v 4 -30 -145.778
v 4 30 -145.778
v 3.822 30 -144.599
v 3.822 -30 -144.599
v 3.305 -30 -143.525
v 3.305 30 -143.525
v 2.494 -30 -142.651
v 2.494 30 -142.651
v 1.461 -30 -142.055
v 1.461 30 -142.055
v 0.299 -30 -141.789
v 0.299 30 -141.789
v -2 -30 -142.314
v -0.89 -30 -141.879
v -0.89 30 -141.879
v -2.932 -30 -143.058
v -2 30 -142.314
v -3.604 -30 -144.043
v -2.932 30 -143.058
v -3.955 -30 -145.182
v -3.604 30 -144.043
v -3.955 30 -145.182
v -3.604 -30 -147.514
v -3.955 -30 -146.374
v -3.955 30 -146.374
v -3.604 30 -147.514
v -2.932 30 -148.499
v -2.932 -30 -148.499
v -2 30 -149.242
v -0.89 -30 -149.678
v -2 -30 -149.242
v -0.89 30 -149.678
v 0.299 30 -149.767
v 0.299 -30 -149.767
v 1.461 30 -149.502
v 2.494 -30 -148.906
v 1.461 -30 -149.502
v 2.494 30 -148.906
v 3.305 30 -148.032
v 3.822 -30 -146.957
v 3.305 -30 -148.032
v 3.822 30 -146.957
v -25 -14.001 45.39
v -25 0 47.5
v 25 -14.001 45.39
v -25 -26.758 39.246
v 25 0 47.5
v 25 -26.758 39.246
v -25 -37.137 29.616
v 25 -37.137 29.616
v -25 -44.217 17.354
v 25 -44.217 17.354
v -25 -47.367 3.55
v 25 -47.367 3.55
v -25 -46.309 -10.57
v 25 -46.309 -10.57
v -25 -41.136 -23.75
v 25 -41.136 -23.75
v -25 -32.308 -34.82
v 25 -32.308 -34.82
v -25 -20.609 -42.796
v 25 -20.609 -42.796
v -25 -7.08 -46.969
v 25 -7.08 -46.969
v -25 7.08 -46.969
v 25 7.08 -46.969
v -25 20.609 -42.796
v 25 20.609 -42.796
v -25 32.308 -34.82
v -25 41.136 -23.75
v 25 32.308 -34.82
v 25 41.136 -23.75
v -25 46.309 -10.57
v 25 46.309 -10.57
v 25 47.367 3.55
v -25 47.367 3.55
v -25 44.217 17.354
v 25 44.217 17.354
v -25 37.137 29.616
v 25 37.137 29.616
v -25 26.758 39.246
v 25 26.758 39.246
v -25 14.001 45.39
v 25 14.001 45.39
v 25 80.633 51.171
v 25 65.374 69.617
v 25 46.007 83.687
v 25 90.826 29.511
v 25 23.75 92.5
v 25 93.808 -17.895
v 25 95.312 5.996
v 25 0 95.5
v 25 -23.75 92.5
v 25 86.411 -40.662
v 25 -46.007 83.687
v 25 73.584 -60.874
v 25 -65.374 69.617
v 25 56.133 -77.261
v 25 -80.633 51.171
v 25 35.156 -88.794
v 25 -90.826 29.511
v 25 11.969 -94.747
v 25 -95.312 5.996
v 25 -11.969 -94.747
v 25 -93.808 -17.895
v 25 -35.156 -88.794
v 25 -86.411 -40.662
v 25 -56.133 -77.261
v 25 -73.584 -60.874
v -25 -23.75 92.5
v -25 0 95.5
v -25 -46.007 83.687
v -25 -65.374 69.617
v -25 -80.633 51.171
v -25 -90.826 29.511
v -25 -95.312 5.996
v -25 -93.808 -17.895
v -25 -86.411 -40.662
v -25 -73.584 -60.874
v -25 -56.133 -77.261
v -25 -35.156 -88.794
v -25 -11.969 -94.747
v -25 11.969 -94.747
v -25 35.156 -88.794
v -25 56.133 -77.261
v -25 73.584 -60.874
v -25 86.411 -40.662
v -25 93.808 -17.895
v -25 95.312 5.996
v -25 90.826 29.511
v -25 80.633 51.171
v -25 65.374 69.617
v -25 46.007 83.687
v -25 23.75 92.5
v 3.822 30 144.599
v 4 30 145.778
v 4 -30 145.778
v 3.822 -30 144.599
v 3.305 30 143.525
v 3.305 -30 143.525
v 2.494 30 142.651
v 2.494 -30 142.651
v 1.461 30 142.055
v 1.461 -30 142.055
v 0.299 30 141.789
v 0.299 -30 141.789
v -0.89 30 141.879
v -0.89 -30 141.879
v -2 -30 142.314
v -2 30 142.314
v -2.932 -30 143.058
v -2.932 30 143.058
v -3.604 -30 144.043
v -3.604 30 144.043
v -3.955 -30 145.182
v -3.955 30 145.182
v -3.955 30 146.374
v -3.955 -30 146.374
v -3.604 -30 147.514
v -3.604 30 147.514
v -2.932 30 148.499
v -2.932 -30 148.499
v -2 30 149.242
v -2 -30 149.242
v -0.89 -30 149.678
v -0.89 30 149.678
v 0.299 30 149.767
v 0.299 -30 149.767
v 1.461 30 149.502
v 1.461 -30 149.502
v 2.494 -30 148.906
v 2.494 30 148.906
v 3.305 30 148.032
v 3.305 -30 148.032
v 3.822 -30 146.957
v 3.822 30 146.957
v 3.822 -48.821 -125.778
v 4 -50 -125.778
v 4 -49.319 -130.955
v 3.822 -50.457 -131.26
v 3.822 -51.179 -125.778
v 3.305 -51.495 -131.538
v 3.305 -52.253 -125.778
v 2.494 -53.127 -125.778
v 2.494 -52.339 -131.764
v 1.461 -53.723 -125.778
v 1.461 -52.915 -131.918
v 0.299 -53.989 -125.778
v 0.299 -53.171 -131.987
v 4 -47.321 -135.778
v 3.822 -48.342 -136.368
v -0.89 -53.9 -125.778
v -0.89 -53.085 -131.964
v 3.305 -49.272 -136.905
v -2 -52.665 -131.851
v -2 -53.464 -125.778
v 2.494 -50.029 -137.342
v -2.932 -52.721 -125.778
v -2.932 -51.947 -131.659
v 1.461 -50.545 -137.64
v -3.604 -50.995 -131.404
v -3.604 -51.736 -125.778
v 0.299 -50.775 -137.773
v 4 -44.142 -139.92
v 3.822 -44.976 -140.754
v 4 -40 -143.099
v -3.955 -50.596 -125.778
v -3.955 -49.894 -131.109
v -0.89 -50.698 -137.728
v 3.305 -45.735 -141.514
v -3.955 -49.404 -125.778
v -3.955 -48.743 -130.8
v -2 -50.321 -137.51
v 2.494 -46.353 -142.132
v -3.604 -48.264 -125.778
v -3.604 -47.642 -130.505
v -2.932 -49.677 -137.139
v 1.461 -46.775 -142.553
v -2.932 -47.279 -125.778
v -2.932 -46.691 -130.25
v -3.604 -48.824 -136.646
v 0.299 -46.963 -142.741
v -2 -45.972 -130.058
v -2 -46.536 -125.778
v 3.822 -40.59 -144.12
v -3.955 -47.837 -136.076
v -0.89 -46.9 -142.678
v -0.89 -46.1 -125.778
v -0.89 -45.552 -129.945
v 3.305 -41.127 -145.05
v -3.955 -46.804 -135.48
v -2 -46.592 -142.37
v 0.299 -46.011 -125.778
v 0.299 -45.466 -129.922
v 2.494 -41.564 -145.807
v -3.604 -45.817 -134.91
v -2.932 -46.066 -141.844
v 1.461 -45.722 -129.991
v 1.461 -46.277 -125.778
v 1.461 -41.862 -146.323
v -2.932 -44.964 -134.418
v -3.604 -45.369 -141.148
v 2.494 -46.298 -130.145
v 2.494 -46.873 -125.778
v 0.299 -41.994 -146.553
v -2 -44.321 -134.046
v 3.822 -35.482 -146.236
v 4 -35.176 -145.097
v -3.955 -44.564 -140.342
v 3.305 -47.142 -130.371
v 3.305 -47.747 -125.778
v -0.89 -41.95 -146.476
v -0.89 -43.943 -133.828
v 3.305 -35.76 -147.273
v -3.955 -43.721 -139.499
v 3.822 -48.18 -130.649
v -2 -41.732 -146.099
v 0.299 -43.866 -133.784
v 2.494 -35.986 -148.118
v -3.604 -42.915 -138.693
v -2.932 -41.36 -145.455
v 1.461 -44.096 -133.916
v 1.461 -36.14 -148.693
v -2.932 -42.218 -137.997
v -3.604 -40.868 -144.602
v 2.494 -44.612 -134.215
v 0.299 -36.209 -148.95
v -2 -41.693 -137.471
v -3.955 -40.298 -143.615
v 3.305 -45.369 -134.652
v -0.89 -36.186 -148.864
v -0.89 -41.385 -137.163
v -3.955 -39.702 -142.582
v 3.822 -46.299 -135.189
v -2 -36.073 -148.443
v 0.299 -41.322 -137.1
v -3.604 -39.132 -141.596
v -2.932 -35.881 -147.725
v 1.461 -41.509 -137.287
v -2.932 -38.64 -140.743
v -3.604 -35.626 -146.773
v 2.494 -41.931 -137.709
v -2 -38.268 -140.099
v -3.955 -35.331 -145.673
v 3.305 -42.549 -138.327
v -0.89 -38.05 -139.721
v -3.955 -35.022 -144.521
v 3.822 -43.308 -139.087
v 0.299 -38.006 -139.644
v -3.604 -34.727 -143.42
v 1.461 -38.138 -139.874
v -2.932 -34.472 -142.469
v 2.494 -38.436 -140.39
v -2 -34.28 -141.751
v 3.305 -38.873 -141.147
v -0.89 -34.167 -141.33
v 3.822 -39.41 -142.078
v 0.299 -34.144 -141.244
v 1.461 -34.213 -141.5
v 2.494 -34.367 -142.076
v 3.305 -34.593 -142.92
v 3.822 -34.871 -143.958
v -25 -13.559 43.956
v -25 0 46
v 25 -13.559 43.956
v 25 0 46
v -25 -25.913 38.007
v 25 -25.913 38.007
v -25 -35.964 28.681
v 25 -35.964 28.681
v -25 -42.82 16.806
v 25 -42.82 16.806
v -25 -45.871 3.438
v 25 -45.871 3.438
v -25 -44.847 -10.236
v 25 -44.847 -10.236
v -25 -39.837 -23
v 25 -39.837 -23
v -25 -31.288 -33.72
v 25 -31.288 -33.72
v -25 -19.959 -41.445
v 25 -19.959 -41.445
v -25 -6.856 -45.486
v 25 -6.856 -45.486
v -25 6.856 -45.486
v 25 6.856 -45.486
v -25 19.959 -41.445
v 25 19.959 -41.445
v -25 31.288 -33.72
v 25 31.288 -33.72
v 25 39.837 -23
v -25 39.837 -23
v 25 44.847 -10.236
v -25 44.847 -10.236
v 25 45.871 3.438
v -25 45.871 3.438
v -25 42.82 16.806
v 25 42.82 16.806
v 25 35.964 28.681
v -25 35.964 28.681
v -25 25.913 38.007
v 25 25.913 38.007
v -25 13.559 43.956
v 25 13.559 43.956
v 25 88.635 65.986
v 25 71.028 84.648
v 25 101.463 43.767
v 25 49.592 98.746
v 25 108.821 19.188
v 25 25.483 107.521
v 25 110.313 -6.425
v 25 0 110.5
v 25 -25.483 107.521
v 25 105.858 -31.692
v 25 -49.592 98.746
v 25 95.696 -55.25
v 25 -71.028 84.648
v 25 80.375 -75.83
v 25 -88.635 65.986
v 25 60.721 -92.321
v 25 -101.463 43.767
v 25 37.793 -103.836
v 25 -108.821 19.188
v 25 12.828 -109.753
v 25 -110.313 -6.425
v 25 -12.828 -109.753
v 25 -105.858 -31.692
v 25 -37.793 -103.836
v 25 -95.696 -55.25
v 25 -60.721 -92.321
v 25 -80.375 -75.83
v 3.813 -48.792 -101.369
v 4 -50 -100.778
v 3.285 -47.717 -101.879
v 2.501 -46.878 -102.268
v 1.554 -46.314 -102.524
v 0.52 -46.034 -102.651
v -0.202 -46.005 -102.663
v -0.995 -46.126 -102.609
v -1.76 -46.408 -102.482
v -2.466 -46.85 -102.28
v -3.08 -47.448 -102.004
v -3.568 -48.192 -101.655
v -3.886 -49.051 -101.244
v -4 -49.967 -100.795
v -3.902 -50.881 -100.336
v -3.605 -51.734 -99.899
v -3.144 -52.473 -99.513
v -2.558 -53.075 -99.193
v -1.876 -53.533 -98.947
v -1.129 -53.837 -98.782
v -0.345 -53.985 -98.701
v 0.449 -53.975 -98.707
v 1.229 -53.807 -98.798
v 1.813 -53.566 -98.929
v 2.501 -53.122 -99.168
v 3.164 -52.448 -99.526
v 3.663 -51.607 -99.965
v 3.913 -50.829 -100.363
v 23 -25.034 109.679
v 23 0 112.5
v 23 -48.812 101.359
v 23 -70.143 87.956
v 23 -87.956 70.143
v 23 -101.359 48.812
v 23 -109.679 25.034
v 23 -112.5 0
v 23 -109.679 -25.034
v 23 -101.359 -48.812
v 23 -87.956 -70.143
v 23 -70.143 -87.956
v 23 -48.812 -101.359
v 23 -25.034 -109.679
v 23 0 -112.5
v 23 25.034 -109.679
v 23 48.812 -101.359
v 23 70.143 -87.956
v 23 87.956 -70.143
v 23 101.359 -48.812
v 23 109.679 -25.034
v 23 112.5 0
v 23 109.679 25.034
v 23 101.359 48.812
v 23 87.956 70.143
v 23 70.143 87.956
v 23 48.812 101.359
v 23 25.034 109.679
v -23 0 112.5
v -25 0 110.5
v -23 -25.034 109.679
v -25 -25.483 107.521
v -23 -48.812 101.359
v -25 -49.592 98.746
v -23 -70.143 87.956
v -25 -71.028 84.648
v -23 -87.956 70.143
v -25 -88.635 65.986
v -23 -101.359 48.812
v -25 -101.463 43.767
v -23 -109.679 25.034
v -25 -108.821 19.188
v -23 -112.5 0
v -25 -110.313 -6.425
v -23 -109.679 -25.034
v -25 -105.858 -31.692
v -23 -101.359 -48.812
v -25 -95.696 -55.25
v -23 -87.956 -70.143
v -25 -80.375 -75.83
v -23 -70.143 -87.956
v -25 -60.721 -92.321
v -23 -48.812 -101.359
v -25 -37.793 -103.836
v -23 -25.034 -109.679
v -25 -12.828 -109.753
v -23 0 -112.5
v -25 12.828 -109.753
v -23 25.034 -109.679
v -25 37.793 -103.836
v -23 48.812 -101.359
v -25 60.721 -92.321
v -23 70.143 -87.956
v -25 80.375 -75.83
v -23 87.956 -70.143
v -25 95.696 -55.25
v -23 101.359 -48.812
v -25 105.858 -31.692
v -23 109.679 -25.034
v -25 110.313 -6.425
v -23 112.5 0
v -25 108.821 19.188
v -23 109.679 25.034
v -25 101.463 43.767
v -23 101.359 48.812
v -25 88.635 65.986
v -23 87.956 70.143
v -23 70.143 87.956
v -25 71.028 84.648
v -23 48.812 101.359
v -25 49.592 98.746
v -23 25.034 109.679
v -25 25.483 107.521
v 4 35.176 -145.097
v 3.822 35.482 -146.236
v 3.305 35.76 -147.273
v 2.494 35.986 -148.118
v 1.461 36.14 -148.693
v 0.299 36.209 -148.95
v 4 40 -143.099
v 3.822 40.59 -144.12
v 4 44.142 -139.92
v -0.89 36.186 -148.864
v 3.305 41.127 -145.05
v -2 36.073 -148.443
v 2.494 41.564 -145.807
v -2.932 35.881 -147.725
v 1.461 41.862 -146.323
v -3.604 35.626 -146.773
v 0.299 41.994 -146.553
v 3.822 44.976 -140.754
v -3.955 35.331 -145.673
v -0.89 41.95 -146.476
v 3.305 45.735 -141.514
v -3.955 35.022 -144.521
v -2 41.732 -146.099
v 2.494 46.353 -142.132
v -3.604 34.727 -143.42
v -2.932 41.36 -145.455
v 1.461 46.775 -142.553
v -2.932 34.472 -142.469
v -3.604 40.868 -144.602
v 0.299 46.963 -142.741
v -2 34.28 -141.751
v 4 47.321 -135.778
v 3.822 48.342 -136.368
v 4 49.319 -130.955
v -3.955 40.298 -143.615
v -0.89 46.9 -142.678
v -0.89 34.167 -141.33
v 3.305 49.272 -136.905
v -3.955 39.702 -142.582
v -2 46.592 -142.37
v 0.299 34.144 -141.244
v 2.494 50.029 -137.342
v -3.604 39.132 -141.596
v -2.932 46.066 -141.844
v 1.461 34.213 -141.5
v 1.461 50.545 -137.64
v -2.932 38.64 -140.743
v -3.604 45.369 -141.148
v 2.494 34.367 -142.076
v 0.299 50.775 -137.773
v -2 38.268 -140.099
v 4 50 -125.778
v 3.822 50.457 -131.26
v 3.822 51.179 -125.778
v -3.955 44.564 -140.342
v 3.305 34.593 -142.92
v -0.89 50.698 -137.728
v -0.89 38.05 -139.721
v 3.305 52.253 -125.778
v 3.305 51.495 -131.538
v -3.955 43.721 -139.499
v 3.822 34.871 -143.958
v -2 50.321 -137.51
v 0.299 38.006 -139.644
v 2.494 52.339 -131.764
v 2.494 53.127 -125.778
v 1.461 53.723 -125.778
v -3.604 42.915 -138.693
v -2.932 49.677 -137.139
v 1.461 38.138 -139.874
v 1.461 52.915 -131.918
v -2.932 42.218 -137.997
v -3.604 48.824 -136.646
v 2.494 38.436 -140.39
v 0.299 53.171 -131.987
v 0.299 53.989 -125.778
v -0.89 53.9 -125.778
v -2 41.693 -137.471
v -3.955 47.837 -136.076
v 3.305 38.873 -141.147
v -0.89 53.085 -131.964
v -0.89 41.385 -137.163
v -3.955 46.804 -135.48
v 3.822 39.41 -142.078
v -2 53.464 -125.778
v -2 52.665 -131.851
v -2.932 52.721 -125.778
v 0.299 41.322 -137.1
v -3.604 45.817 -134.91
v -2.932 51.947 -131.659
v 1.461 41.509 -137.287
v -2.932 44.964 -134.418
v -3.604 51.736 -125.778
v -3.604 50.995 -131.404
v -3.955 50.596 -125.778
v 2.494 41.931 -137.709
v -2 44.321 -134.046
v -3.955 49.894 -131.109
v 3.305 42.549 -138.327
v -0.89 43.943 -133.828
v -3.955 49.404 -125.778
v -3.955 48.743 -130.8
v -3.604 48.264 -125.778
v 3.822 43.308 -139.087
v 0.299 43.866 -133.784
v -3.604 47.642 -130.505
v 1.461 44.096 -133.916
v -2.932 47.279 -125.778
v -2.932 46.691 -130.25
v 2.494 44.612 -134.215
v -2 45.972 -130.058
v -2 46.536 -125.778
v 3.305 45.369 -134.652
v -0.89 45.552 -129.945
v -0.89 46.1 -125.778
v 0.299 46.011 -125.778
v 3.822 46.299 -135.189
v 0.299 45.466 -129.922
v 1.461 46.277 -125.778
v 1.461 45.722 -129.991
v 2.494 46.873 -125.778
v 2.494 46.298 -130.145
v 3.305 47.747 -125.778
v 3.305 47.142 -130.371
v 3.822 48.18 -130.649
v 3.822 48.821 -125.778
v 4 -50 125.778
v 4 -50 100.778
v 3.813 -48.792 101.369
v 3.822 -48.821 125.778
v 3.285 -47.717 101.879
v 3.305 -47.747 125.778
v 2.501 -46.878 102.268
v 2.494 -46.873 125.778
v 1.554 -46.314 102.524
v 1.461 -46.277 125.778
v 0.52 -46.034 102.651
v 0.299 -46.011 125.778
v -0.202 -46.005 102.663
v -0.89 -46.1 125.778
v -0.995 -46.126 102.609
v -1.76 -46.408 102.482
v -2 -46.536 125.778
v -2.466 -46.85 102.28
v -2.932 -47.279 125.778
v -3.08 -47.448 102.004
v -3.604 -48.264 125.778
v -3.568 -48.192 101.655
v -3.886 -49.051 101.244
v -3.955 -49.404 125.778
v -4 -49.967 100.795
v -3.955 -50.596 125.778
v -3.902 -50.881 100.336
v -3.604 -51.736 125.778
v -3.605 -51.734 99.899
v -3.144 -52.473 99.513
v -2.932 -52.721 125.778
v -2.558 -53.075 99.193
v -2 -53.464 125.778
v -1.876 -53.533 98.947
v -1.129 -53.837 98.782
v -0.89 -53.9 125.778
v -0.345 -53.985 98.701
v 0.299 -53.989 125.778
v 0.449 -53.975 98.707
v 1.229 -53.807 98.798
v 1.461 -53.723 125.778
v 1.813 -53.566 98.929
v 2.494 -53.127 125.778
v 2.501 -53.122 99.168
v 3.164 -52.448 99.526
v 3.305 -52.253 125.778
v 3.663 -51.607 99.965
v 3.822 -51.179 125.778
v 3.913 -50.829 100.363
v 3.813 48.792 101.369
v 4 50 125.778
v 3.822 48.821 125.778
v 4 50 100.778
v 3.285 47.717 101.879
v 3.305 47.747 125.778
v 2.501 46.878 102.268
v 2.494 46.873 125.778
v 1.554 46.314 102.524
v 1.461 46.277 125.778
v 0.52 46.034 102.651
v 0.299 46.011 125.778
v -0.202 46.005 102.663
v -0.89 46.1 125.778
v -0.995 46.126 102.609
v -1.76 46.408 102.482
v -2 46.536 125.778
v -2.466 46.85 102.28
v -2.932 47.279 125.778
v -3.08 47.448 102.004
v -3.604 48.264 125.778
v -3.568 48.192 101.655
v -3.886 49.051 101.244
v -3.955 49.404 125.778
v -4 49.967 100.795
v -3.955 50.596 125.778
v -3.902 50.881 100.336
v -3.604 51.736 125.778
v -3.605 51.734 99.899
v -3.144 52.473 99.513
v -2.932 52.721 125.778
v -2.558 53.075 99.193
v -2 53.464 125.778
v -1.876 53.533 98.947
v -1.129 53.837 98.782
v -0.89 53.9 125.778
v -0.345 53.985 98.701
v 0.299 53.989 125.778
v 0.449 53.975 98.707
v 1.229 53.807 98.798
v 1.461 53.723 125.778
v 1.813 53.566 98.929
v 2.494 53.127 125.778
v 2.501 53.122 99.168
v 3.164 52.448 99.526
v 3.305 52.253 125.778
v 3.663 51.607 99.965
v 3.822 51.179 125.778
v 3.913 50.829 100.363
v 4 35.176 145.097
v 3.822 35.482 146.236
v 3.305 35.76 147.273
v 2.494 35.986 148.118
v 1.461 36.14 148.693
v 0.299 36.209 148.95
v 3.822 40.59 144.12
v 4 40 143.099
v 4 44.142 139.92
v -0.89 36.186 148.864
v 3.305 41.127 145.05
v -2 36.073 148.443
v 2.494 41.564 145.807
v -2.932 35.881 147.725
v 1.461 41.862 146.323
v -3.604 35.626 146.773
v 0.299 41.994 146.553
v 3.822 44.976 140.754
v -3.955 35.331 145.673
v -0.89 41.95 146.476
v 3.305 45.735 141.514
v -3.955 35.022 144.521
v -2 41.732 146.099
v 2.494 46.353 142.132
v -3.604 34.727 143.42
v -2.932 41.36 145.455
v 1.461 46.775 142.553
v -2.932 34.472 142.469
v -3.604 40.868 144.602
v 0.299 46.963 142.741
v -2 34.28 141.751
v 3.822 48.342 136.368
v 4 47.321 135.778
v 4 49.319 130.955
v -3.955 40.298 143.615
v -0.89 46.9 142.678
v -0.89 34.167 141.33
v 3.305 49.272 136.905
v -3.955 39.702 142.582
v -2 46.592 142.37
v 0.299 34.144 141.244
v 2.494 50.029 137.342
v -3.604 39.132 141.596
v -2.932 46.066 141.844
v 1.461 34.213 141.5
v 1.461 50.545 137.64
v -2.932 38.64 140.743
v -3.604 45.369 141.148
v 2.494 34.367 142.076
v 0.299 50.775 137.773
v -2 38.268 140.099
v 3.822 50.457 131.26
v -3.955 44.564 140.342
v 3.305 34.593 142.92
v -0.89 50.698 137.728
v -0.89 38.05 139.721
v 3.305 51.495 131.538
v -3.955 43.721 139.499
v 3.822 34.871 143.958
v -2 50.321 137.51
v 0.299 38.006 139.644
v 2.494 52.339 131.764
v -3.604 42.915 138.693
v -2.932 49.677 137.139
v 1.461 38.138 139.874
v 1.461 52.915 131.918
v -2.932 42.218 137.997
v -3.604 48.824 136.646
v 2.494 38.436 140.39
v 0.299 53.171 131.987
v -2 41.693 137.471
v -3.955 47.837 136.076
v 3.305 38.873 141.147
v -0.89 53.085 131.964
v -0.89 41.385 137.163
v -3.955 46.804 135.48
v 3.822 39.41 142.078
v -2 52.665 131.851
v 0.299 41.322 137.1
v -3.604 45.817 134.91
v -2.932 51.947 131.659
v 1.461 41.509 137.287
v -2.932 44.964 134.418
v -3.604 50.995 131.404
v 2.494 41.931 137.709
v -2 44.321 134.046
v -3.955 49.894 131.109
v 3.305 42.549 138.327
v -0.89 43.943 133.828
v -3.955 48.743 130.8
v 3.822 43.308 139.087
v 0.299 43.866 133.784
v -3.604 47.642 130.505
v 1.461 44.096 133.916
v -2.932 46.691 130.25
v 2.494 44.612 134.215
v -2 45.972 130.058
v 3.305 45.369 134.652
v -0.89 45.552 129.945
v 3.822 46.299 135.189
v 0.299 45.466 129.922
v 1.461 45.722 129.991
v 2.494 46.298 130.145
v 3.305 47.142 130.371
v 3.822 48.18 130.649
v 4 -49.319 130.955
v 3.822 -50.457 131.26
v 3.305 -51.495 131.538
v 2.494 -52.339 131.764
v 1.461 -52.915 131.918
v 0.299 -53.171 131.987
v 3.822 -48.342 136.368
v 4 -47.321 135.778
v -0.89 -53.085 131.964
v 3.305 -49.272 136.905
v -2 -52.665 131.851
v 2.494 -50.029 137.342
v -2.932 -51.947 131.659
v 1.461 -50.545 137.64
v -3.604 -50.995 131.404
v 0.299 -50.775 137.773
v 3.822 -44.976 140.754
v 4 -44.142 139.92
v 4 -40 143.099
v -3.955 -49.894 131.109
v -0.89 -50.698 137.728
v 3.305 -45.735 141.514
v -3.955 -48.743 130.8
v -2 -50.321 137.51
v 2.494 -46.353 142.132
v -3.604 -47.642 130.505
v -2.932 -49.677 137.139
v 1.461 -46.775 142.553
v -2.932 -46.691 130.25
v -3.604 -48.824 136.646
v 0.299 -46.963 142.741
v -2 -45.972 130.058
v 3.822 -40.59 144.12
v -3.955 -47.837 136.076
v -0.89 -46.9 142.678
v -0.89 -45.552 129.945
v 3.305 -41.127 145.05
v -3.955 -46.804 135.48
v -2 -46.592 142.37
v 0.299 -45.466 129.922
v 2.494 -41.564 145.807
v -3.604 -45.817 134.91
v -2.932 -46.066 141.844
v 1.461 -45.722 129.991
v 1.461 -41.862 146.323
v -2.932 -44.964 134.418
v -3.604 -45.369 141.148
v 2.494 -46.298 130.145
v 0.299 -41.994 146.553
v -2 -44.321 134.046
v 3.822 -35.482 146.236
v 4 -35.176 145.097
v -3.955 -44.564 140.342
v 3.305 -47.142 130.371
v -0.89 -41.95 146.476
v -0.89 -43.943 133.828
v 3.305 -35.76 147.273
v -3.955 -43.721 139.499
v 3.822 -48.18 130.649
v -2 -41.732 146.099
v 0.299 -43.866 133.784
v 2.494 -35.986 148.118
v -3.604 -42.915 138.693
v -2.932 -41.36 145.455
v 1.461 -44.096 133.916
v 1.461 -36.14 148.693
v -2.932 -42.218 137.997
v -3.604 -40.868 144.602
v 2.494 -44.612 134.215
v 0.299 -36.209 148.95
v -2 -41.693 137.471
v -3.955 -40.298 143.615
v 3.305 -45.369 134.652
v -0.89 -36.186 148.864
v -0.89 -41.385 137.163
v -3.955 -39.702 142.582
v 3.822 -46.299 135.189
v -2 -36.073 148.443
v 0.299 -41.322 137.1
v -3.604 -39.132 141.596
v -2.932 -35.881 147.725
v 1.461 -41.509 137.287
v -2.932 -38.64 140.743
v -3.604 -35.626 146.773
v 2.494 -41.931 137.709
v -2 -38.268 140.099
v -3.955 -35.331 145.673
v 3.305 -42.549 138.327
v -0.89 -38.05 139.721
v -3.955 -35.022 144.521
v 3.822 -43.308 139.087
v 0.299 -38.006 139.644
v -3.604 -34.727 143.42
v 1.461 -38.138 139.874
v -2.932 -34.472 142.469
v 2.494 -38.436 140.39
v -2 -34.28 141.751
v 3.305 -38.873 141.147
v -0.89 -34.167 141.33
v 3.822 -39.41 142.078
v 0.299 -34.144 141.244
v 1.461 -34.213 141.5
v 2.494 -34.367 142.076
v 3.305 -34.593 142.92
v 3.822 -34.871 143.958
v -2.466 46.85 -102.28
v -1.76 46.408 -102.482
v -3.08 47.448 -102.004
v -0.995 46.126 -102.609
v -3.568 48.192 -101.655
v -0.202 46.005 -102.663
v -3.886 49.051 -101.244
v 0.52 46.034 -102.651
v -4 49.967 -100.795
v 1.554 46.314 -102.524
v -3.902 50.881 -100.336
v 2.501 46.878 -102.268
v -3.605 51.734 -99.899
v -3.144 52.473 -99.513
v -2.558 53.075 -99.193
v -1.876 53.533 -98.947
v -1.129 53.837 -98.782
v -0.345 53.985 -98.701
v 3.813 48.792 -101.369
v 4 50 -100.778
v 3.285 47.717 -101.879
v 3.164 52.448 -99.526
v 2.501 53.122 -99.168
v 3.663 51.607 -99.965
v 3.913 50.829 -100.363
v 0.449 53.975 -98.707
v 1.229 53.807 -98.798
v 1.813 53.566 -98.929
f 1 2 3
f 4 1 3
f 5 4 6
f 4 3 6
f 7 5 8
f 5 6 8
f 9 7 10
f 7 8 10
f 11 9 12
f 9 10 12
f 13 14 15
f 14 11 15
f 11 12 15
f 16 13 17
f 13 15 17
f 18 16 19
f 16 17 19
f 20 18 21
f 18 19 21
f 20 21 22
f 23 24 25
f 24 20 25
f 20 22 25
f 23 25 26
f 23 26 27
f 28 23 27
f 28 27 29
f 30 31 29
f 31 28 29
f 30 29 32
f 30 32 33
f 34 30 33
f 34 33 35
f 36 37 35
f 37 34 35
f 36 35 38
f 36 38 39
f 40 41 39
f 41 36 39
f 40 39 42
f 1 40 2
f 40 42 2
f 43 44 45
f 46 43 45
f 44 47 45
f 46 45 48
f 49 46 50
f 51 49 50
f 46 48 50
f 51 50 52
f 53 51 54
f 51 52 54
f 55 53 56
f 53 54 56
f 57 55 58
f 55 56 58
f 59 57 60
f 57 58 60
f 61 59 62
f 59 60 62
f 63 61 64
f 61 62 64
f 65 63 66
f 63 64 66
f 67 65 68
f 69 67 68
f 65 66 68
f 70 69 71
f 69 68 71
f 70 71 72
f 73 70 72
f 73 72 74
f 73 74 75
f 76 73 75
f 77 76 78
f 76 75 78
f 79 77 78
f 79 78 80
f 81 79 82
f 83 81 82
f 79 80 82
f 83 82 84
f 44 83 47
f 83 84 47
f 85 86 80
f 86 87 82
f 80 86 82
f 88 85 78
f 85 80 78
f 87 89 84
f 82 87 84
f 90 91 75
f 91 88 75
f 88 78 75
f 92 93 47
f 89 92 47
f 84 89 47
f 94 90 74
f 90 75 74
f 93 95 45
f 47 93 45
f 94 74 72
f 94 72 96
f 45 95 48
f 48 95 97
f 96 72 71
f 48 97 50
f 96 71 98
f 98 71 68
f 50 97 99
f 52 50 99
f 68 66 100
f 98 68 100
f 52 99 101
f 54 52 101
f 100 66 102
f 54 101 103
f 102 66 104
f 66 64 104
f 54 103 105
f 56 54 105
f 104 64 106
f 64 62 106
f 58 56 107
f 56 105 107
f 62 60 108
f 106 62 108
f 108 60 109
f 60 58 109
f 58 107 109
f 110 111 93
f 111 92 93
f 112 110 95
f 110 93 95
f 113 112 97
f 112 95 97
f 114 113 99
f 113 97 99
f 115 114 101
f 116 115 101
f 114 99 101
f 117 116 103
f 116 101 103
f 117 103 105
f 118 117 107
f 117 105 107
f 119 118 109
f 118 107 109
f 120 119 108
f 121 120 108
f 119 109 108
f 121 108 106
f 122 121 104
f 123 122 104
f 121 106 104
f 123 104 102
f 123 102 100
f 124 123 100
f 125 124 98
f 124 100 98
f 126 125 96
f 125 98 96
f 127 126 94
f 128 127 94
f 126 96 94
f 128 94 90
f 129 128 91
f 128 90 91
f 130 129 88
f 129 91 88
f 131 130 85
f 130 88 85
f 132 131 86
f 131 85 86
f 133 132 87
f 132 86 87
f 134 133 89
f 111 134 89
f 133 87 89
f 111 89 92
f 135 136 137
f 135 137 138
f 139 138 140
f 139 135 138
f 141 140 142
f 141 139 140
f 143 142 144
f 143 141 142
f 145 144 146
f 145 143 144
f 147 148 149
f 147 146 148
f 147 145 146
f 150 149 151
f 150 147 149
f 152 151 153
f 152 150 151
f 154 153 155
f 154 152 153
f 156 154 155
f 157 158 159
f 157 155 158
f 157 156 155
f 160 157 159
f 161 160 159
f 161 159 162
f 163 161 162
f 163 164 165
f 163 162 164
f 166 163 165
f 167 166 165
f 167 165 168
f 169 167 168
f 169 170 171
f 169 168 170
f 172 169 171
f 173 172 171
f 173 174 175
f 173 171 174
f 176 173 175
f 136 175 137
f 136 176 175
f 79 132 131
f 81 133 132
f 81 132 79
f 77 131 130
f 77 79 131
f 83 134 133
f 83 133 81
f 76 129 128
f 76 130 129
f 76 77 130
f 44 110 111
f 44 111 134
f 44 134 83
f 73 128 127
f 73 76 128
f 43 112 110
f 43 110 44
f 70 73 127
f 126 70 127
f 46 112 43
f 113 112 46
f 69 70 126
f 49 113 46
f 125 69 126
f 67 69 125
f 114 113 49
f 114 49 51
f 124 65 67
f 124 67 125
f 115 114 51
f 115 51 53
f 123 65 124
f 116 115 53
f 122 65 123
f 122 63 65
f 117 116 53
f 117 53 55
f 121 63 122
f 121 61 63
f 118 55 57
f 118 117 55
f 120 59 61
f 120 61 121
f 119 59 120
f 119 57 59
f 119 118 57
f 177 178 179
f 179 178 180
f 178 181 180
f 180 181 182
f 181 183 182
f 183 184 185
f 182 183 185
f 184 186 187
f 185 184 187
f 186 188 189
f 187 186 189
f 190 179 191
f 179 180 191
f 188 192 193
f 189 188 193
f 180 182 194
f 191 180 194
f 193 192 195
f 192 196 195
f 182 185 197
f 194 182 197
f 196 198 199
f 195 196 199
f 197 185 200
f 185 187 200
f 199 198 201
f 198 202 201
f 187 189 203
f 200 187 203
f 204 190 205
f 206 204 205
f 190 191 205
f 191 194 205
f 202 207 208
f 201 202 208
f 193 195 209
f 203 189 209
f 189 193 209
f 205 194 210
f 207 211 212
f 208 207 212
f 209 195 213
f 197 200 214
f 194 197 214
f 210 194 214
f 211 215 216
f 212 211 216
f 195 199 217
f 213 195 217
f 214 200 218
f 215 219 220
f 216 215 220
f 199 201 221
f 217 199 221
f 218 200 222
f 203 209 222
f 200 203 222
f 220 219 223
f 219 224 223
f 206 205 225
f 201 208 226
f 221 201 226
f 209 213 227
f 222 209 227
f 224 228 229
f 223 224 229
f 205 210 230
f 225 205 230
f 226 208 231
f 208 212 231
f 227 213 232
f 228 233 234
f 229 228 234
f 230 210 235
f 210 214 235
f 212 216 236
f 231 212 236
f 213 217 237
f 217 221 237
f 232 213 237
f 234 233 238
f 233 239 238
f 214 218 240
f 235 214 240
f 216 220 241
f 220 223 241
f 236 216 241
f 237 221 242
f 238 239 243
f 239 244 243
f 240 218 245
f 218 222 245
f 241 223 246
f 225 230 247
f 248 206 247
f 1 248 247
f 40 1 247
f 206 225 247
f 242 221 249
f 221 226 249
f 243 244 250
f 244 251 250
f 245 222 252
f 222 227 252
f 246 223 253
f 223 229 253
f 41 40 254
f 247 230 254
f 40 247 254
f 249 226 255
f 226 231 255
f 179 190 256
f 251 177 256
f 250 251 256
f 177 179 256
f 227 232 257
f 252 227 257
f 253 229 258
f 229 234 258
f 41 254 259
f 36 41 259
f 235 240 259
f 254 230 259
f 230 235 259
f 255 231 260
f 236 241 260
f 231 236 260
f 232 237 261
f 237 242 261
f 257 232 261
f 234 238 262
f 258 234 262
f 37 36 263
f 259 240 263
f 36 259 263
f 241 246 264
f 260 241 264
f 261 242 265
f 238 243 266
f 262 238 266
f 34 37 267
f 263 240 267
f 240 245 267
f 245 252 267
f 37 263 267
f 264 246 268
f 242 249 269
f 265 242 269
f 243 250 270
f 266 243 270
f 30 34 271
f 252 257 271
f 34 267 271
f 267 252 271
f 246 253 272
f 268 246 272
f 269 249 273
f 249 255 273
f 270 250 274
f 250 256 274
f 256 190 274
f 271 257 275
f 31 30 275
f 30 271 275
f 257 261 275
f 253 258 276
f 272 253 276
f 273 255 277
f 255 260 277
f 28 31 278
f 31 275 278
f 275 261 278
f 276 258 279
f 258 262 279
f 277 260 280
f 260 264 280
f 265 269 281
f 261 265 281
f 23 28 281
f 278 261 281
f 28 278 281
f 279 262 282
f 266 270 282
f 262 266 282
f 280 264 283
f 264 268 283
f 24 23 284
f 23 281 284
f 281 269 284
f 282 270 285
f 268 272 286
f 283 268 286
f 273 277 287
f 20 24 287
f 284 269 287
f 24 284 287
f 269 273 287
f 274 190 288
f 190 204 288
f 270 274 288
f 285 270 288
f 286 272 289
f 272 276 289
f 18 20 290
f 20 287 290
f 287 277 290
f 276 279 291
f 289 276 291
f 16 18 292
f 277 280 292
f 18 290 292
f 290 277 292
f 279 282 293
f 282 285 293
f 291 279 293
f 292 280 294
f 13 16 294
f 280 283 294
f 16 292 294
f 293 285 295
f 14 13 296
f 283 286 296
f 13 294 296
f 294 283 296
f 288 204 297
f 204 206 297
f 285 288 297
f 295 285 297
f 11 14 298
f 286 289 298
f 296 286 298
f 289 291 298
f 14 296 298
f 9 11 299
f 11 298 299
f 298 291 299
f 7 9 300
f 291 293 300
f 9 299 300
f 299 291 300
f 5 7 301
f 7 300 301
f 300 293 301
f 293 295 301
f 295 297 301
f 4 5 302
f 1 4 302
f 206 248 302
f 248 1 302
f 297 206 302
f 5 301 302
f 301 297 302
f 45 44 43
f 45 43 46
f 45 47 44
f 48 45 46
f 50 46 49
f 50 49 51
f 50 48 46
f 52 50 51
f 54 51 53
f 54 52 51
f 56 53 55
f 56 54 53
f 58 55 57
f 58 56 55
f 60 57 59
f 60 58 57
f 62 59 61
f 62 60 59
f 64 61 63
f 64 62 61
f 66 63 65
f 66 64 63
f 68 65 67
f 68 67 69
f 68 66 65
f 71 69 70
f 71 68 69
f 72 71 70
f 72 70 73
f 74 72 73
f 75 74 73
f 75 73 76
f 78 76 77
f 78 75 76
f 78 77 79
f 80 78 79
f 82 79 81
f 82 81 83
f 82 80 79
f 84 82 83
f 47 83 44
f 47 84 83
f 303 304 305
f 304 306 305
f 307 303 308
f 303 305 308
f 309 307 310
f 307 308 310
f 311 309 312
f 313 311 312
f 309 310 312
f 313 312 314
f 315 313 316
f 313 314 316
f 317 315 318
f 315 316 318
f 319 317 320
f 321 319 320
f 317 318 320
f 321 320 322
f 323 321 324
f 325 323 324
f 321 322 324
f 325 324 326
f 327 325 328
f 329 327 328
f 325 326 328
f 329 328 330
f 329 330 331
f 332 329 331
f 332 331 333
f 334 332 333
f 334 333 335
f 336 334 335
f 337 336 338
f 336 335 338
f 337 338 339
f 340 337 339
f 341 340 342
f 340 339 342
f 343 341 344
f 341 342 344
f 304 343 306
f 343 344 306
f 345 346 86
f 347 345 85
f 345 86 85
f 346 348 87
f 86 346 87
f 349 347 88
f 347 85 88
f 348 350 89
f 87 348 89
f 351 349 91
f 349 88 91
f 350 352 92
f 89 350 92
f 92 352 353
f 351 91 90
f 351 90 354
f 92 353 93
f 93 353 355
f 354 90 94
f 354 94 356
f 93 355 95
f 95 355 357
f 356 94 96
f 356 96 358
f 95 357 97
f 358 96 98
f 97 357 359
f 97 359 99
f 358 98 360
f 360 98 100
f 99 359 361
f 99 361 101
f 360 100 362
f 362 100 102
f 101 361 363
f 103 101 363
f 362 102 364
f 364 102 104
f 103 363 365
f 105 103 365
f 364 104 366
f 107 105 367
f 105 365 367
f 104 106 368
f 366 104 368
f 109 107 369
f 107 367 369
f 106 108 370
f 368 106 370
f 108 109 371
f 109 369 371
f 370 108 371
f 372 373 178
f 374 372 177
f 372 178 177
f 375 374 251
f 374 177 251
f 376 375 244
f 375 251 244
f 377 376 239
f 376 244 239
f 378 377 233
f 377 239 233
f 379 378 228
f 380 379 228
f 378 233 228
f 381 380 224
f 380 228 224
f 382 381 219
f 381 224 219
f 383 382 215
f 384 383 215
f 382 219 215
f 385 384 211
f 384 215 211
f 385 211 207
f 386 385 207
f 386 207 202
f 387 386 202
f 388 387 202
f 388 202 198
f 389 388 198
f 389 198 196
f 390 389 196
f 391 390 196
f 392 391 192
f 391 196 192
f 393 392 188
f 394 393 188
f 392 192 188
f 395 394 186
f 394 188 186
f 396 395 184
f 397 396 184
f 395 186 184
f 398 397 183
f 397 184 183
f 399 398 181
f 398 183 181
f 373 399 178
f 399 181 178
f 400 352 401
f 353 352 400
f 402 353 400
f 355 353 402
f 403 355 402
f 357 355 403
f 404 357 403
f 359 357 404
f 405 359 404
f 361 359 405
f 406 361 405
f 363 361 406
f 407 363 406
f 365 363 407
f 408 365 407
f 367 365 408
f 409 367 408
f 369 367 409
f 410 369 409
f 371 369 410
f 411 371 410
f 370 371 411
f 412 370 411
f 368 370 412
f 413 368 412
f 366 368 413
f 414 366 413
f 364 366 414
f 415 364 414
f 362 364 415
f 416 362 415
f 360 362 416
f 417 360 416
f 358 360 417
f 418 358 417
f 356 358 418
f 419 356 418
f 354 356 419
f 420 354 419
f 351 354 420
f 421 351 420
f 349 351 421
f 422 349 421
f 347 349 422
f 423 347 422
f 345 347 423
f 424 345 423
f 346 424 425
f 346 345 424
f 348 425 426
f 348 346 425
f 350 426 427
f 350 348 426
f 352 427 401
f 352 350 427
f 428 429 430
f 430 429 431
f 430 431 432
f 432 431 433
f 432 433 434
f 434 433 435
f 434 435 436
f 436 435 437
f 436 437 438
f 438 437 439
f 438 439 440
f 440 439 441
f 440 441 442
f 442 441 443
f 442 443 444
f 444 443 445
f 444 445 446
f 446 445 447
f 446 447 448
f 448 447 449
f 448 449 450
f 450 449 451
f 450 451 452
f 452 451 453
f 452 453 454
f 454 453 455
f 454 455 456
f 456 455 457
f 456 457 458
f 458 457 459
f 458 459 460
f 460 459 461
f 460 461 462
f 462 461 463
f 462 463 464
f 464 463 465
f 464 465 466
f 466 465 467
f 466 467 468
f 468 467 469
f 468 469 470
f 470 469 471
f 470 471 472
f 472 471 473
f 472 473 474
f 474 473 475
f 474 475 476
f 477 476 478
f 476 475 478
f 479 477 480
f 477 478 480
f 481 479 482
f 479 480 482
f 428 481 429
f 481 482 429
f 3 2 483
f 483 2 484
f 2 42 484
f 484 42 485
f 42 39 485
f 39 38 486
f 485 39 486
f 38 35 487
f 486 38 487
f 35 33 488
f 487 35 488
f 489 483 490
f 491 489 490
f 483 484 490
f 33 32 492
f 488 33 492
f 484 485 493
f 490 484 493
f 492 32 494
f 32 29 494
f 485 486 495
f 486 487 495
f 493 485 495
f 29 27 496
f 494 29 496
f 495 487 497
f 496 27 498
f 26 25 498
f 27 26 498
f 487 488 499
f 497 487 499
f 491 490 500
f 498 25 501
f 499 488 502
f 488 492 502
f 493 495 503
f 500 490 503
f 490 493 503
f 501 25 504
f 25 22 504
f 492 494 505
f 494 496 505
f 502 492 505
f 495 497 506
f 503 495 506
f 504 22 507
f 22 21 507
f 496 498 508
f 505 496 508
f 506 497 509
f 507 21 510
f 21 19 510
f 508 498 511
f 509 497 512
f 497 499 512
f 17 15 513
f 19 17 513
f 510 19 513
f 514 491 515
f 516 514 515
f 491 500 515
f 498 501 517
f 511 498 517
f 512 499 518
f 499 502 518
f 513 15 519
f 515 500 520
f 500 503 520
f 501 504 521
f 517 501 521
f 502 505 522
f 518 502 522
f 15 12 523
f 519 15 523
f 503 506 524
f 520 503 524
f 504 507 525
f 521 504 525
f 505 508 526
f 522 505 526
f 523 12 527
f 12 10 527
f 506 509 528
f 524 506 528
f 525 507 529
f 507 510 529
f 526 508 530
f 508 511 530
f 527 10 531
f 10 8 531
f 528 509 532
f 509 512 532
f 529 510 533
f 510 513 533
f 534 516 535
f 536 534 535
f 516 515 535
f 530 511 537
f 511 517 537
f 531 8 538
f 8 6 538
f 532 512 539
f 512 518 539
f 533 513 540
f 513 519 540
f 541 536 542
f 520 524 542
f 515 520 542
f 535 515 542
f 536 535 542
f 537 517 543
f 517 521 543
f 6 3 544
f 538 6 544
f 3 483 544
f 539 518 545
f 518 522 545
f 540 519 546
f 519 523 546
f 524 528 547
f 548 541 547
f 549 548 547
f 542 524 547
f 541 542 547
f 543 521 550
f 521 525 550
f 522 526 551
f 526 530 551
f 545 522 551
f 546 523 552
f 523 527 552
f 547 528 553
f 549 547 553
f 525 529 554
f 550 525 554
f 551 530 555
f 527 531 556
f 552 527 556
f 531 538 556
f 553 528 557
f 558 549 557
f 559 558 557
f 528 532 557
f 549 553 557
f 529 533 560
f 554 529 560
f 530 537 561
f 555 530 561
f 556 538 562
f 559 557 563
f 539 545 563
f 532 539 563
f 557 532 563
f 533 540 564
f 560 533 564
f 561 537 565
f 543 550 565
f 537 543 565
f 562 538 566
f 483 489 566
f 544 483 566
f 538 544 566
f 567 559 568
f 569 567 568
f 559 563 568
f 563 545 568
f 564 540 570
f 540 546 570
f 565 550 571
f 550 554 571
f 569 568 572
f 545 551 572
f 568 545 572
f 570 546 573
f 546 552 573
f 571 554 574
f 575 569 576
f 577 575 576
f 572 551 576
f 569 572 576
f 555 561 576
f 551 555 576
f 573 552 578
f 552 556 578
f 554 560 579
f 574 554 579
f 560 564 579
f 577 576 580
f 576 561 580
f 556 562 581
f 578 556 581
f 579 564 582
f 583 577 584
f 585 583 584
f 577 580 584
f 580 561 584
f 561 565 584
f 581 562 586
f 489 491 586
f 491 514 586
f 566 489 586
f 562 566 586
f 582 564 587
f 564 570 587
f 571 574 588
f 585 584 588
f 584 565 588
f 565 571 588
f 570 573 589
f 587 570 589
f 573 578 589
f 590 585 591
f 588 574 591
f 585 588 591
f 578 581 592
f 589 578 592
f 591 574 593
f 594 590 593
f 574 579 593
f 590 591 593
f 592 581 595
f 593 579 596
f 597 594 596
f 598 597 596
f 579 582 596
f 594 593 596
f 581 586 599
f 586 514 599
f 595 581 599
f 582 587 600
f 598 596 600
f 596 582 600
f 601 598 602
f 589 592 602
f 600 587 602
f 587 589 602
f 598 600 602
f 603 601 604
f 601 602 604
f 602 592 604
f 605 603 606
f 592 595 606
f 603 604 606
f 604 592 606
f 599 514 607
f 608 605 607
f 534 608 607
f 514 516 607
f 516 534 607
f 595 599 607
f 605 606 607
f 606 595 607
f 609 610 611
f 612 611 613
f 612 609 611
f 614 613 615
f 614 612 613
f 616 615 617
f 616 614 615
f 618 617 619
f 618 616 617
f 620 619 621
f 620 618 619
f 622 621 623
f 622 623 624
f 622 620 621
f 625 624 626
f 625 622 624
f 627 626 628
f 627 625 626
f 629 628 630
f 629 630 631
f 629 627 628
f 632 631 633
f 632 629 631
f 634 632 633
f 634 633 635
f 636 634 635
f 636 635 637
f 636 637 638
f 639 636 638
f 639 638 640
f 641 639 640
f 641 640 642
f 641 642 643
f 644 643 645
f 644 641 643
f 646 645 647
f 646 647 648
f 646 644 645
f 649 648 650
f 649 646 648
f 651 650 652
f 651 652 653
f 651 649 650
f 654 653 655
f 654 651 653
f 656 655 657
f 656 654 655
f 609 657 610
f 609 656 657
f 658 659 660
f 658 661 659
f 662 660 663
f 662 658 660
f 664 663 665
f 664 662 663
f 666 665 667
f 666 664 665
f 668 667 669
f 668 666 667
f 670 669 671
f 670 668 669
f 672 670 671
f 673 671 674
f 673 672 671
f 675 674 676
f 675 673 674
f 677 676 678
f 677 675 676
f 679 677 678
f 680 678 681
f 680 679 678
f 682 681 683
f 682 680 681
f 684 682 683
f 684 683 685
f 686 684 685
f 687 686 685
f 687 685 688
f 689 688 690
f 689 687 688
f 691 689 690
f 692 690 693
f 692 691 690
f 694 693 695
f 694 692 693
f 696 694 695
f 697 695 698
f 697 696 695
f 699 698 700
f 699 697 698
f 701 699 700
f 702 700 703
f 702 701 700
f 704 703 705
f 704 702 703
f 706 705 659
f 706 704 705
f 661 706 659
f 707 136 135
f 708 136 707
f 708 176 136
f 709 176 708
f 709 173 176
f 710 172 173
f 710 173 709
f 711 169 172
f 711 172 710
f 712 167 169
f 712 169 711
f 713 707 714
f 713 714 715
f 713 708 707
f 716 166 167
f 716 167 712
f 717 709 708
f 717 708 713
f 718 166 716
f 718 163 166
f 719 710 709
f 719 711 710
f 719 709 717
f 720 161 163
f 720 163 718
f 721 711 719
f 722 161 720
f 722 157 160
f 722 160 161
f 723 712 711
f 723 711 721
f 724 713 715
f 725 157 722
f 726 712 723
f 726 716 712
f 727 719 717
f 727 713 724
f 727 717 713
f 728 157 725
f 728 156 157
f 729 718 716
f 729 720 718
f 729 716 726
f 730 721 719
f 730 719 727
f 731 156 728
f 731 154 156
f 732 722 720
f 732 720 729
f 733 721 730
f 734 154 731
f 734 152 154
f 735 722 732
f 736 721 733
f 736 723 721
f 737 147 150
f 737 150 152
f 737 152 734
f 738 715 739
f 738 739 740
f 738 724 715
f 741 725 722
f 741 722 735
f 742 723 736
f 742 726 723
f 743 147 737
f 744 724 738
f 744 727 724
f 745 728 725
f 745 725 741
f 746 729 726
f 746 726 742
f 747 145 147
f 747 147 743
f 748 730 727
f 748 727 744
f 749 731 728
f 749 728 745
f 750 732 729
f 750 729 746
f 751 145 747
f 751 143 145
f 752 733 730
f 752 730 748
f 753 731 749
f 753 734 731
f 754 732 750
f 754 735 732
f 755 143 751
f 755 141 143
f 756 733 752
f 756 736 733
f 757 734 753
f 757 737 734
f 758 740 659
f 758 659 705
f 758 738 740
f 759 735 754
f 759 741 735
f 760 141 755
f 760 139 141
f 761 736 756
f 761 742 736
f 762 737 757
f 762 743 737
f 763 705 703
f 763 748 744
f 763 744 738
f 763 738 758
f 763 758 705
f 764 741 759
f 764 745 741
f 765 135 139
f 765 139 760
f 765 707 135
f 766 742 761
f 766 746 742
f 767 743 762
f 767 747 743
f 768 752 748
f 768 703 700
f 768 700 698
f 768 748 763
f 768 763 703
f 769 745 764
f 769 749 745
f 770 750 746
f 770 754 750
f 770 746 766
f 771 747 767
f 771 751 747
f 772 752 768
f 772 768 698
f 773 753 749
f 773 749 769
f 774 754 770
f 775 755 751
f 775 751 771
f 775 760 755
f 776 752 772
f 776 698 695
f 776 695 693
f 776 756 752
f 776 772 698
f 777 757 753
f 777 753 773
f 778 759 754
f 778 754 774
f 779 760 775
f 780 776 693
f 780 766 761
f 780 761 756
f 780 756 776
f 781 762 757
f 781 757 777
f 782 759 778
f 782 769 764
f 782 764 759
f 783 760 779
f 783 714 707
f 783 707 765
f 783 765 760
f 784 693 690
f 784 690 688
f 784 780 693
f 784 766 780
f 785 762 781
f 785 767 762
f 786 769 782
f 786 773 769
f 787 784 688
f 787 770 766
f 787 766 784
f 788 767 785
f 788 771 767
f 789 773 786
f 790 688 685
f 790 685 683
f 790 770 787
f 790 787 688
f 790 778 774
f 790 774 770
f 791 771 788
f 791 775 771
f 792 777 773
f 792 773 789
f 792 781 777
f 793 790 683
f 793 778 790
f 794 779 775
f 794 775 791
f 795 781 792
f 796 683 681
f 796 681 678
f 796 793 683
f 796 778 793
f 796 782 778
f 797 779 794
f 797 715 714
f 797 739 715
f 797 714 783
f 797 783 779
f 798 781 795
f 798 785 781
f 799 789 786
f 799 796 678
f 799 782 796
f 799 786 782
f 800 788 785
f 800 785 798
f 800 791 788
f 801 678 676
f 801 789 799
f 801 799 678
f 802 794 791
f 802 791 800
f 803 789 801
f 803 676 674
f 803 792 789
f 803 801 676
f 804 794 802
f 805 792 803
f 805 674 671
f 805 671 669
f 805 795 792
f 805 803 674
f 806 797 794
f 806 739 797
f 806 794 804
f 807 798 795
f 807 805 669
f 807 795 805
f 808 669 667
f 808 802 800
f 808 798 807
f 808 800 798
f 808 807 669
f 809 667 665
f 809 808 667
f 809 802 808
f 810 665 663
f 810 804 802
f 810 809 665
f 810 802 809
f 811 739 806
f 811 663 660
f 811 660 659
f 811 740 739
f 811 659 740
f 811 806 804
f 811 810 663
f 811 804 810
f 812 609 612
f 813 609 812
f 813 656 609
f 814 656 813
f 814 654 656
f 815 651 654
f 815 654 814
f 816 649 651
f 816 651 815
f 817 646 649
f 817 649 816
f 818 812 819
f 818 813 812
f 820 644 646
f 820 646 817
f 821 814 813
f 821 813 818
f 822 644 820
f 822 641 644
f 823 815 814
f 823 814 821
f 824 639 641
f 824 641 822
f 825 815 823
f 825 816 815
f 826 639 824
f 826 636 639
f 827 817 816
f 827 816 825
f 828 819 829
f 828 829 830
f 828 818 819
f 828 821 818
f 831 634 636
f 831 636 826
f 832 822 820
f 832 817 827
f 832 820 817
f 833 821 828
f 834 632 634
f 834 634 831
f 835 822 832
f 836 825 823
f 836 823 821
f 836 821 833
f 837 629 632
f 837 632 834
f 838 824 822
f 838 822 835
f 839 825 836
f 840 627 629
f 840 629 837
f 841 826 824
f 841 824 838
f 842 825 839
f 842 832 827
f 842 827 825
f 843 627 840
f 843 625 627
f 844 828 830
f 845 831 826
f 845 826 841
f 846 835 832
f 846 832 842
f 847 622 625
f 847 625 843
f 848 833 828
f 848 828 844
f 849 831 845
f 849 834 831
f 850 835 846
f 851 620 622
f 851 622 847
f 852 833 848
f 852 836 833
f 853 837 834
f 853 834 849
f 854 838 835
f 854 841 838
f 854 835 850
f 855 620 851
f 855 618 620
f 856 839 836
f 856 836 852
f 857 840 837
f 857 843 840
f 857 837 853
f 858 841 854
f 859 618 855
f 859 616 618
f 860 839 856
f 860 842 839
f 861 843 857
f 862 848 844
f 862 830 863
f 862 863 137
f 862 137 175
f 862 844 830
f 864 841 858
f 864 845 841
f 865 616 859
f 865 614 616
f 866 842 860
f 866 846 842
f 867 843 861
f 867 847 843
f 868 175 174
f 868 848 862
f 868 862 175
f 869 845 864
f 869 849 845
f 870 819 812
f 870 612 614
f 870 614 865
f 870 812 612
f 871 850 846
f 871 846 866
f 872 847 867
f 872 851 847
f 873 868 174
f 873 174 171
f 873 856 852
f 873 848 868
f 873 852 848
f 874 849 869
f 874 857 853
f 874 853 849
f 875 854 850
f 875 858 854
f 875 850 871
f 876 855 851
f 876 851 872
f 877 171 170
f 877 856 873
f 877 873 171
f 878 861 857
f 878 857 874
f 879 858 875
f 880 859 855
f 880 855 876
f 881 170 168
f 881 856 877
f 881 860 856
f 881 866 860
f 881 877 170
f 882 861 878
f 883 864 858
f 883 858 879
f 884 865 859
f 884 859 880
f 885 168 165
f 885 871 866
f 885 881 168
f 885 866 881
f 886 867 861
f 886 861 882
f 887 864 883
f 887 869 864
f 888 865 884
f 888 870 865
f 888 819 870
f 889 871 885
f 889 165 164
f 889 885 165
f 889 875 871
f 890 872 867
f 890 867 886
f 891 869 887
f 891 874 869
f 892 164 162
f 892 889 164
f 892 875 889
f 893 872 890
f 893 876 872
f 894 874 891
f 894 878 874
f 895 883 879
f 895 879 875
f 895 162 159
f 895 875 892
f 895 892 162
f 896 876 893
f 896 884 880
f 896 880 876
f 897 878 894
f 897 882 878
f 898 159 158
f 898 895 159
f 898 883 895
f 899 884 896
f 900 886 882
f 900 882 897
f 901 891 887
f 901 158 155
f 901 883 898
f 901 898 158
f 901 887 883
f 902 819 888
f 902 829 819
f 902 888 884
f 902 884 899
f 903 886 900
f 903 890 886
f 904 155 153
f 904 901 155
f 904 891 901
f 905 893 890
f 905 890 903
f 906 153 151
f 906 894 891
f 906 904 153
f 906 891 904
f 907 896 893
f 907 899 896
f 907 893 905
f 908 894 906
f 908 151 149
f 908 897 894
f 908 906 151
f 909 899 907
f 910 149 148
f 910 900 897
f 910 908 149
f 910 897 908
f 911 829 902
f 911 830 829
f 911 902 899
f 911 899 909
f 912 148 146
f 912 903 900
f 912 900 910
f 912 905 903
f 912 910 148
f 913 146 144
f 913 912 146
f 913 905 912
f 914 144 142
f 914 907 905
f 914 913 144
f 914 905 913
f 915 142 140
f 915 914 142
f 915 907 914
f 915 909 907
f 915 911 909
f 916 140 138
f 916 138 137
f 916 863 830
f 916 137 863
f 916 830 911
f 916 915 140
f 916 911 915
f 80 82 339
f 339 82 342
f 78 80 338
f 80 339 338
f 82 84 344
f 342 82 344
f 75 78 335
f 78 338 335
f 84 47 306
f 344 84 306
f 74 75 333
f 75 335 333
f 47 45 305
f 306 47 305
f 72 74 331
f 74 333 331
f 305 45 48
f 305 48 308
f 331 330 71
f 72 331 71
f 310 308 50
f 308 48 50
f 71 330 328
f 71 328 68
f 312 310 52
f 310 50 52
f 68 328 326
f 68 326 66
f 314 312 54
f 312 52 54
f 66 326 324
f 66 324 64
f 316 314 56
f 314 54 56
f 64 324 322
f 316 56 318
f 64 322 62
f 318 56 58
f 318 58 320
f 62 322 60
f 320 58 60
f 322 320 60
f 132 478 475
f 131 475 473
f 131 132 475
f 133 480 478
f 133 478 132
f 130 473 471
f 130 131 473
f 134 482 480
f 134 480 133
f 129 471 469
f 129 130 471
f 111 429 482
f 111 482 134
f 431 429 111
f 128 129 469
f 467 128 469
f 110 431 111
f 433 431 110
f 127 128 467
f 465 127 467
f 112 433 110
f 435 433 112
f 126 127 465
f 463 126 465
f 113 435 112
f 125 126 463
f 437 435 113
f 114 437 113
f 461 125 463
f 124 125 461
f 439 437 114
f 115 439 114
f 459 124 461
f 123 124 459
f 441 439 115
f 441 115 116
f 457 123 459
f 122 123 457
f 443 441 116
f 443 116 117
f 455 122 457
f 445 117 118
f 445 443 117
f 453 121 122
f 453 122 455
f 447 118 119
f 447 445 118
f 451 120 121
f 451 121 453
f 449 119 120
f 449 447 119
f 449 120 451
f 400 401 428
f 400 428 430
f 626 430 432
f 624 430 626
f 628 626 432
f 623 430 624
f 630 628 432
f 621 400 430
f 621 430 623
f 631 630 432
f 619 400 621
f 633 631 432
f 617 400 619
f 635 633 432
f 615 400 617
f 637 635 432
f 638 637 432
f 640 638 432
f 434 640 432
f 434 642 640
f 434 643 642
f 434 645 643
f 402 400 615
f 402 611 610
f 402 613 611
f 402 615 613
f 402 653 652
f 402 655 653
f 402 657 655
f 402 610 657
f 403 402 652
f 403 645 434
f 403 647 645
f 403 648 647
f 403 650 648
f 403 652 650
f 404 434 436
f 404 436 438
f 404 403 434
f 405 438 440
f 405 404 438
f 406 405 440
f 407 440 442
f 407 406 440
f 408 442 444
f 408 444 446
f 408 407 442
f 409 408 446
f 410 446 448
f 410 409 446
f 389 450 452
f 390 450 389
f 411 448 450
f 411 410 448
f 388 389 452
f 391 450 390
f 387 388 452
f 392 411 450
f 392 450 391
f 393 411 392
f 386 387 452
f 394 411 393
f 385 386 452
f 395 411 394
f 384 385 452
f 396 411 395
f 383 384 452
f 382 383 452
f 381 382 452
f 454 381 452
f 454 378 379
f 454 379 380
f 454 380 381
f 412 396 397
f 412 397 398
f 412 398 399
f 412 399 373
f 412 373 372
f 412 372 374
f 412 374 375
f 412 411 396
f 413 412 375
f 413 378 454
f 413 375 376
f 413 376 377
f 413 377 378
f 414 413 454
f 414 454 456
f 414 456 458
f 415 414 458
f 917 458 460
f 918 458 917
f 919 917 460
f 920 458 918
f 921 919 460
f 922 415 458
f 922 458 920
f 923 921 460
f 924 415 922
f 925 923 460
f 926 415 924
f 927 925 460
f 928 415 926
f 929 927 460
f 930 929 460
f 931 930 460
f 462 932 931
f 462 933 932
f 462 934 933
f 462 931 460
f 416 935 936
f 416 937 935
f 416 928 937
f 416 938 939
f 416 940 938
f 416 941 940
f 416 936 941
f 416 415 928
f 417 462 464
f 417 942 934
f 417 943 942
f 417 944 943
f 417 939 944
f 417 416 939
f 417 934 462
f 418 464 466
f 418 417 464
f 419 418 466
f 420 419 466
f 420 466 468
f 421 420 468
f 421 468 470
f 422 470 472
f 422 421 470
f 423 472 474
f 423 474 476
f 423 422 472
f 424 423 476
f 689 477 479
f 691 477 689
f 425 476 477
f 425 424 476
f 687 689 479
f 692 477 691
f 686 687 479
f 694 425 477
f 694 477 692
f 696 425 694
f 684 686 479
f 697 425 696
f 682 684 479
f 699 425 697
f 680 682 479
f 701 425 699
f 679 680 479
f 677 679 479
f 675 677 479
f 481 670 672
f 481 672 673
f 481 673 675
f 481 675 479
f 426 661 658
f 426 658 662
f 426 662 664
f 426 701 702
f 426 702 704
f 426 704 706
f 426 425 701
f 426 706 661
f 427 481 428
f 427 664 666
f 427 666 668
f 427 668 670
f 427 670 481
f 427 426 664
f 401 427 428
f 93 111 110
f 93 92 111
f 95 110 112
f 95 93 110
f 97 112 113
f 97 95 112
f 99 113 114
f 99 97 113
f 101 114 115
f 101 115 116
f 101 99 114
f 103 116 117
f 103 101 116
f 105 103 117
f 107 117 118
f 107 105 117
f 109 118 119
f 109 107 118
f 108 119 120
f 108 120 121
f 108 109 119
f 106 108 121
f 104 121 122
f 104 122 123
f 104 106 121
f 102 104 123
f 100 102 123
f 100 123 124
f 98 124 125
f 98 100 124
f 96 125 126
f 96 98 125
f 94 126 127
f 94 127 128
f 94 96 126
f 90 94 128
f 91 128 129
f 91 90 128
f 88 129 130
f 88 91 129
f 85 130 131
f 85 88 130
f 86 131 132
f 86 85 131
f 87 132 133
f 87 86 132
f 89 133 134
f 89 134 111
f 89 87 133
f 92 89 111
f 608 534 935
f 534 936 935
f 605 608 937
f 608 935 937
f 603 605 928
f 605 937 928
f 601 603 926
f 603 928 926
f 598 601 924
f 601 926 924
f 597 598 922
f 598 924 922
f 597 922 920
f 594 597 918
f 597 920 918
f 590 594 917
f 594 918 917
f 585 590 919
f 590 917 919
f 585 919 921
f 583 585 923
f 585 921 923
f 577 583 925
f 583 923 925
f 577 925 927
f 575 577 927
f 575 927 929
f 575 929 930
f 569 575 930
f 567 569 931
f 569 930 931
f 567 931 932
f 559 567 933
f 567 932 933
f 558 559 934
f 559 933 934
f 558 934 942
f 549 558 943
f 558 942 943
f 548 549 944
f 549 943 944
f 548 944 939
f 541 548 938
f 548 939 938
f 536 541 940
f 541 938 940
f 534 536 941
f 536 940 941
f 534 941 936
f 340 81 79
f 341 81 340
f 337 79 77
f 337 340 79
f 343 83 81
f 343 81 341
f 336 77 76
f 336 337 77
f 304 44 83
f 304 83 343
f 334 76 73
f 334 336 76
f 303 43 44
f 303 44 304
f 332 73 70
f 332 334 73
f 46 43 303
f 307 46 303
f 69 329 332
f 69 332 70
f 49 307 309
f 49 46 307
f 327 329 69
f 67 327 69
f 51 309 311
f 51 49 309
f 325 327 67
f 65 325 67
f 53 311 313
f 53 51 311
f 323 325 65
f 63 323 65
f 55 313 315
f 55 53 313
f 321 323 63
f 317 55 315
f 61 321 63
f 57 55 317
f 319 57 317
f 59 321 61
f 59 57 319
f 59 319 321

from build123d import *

# Parameters (mm, degrees)
F0_W     = 50
F0_H     = 1.5
F2_W     = 50
F2_H     = 48
F4_W     = 50
F4_H     = 17
F8_R     = 4
F11_SIZE = 2


with BuildPart() as f1:
    # F0 (on Front) → F1 (revolve)
    with BuildSketch(Plane.XZ):
        with Locations((0, 46.75)):
            Rectangle(F0_W, F0_H)
    revolve(axis=Axis((0, 0, 0), (1, 0, 0)))


with BuildPart() as f3:
    # F2 (on Front) → F3 (revolve)
    with BuildSketch(Plane.XZ):
        with Locations((0, 71.5)):
            Rectangle(F2_W, F2_H)
    revolve(axis=Axis((0, 0, 0), (1, 0, 0)))


with BuildPart() as f5:
    # F4 (on Front) → F5 (revolve)
    with BuildSketch(Plane.XZ):
        with Locations((0, 104)):
            Rectangle(F4_W, F4_H)
    revolve(axis=Axis((0, 0, 0), (1, 0, 0)))



with BuildPart() as f9:
    # F9: sweep along a path in F6
    with BuildLine(Plane.YZ) as f9_path:
        Line((-50, 95.1643315534), (-50, 125.7782218537))
        ThreePointArc((-50, 125.7782218537), (-44.1421356237, 139.9203574775), (-30, 145.7782218537))
        Line((-30, 145.7782218537), (30, 145.7782218537))
        ThreePointArc((30, 145.7782218537), (44.1421356237, 139.9203574775), (50, 125.7782218537))
        Line((50, 125.7782218537), (50, 95.1643315534))
    # F8 (on plane+point) → F9 (sweep)
    with BuildSketch(Plane.XY.offset(95.1643315534)):
        with Locations((0, -50)):
            Circle(F8_R)
    sweep(path=f9_path.line)


with BuildPart() as f5_1:
    add(f5.part)

    add(f9.part)  # F10 merges F9
    # F10: F9 across plane
    add(f9.part.mirror(Plane.XY))

    # F11
    f11_edges = [f5_1.edges().sort_by_distance(p)[0] for p in [
        (25, 0, -112.5),
        (-25, 0, -112.5),
    ]]
    chamfer(f11_edges, length=F11_SIZE)


solid = Compound([f1.part, f3.part, f5_1.part])
